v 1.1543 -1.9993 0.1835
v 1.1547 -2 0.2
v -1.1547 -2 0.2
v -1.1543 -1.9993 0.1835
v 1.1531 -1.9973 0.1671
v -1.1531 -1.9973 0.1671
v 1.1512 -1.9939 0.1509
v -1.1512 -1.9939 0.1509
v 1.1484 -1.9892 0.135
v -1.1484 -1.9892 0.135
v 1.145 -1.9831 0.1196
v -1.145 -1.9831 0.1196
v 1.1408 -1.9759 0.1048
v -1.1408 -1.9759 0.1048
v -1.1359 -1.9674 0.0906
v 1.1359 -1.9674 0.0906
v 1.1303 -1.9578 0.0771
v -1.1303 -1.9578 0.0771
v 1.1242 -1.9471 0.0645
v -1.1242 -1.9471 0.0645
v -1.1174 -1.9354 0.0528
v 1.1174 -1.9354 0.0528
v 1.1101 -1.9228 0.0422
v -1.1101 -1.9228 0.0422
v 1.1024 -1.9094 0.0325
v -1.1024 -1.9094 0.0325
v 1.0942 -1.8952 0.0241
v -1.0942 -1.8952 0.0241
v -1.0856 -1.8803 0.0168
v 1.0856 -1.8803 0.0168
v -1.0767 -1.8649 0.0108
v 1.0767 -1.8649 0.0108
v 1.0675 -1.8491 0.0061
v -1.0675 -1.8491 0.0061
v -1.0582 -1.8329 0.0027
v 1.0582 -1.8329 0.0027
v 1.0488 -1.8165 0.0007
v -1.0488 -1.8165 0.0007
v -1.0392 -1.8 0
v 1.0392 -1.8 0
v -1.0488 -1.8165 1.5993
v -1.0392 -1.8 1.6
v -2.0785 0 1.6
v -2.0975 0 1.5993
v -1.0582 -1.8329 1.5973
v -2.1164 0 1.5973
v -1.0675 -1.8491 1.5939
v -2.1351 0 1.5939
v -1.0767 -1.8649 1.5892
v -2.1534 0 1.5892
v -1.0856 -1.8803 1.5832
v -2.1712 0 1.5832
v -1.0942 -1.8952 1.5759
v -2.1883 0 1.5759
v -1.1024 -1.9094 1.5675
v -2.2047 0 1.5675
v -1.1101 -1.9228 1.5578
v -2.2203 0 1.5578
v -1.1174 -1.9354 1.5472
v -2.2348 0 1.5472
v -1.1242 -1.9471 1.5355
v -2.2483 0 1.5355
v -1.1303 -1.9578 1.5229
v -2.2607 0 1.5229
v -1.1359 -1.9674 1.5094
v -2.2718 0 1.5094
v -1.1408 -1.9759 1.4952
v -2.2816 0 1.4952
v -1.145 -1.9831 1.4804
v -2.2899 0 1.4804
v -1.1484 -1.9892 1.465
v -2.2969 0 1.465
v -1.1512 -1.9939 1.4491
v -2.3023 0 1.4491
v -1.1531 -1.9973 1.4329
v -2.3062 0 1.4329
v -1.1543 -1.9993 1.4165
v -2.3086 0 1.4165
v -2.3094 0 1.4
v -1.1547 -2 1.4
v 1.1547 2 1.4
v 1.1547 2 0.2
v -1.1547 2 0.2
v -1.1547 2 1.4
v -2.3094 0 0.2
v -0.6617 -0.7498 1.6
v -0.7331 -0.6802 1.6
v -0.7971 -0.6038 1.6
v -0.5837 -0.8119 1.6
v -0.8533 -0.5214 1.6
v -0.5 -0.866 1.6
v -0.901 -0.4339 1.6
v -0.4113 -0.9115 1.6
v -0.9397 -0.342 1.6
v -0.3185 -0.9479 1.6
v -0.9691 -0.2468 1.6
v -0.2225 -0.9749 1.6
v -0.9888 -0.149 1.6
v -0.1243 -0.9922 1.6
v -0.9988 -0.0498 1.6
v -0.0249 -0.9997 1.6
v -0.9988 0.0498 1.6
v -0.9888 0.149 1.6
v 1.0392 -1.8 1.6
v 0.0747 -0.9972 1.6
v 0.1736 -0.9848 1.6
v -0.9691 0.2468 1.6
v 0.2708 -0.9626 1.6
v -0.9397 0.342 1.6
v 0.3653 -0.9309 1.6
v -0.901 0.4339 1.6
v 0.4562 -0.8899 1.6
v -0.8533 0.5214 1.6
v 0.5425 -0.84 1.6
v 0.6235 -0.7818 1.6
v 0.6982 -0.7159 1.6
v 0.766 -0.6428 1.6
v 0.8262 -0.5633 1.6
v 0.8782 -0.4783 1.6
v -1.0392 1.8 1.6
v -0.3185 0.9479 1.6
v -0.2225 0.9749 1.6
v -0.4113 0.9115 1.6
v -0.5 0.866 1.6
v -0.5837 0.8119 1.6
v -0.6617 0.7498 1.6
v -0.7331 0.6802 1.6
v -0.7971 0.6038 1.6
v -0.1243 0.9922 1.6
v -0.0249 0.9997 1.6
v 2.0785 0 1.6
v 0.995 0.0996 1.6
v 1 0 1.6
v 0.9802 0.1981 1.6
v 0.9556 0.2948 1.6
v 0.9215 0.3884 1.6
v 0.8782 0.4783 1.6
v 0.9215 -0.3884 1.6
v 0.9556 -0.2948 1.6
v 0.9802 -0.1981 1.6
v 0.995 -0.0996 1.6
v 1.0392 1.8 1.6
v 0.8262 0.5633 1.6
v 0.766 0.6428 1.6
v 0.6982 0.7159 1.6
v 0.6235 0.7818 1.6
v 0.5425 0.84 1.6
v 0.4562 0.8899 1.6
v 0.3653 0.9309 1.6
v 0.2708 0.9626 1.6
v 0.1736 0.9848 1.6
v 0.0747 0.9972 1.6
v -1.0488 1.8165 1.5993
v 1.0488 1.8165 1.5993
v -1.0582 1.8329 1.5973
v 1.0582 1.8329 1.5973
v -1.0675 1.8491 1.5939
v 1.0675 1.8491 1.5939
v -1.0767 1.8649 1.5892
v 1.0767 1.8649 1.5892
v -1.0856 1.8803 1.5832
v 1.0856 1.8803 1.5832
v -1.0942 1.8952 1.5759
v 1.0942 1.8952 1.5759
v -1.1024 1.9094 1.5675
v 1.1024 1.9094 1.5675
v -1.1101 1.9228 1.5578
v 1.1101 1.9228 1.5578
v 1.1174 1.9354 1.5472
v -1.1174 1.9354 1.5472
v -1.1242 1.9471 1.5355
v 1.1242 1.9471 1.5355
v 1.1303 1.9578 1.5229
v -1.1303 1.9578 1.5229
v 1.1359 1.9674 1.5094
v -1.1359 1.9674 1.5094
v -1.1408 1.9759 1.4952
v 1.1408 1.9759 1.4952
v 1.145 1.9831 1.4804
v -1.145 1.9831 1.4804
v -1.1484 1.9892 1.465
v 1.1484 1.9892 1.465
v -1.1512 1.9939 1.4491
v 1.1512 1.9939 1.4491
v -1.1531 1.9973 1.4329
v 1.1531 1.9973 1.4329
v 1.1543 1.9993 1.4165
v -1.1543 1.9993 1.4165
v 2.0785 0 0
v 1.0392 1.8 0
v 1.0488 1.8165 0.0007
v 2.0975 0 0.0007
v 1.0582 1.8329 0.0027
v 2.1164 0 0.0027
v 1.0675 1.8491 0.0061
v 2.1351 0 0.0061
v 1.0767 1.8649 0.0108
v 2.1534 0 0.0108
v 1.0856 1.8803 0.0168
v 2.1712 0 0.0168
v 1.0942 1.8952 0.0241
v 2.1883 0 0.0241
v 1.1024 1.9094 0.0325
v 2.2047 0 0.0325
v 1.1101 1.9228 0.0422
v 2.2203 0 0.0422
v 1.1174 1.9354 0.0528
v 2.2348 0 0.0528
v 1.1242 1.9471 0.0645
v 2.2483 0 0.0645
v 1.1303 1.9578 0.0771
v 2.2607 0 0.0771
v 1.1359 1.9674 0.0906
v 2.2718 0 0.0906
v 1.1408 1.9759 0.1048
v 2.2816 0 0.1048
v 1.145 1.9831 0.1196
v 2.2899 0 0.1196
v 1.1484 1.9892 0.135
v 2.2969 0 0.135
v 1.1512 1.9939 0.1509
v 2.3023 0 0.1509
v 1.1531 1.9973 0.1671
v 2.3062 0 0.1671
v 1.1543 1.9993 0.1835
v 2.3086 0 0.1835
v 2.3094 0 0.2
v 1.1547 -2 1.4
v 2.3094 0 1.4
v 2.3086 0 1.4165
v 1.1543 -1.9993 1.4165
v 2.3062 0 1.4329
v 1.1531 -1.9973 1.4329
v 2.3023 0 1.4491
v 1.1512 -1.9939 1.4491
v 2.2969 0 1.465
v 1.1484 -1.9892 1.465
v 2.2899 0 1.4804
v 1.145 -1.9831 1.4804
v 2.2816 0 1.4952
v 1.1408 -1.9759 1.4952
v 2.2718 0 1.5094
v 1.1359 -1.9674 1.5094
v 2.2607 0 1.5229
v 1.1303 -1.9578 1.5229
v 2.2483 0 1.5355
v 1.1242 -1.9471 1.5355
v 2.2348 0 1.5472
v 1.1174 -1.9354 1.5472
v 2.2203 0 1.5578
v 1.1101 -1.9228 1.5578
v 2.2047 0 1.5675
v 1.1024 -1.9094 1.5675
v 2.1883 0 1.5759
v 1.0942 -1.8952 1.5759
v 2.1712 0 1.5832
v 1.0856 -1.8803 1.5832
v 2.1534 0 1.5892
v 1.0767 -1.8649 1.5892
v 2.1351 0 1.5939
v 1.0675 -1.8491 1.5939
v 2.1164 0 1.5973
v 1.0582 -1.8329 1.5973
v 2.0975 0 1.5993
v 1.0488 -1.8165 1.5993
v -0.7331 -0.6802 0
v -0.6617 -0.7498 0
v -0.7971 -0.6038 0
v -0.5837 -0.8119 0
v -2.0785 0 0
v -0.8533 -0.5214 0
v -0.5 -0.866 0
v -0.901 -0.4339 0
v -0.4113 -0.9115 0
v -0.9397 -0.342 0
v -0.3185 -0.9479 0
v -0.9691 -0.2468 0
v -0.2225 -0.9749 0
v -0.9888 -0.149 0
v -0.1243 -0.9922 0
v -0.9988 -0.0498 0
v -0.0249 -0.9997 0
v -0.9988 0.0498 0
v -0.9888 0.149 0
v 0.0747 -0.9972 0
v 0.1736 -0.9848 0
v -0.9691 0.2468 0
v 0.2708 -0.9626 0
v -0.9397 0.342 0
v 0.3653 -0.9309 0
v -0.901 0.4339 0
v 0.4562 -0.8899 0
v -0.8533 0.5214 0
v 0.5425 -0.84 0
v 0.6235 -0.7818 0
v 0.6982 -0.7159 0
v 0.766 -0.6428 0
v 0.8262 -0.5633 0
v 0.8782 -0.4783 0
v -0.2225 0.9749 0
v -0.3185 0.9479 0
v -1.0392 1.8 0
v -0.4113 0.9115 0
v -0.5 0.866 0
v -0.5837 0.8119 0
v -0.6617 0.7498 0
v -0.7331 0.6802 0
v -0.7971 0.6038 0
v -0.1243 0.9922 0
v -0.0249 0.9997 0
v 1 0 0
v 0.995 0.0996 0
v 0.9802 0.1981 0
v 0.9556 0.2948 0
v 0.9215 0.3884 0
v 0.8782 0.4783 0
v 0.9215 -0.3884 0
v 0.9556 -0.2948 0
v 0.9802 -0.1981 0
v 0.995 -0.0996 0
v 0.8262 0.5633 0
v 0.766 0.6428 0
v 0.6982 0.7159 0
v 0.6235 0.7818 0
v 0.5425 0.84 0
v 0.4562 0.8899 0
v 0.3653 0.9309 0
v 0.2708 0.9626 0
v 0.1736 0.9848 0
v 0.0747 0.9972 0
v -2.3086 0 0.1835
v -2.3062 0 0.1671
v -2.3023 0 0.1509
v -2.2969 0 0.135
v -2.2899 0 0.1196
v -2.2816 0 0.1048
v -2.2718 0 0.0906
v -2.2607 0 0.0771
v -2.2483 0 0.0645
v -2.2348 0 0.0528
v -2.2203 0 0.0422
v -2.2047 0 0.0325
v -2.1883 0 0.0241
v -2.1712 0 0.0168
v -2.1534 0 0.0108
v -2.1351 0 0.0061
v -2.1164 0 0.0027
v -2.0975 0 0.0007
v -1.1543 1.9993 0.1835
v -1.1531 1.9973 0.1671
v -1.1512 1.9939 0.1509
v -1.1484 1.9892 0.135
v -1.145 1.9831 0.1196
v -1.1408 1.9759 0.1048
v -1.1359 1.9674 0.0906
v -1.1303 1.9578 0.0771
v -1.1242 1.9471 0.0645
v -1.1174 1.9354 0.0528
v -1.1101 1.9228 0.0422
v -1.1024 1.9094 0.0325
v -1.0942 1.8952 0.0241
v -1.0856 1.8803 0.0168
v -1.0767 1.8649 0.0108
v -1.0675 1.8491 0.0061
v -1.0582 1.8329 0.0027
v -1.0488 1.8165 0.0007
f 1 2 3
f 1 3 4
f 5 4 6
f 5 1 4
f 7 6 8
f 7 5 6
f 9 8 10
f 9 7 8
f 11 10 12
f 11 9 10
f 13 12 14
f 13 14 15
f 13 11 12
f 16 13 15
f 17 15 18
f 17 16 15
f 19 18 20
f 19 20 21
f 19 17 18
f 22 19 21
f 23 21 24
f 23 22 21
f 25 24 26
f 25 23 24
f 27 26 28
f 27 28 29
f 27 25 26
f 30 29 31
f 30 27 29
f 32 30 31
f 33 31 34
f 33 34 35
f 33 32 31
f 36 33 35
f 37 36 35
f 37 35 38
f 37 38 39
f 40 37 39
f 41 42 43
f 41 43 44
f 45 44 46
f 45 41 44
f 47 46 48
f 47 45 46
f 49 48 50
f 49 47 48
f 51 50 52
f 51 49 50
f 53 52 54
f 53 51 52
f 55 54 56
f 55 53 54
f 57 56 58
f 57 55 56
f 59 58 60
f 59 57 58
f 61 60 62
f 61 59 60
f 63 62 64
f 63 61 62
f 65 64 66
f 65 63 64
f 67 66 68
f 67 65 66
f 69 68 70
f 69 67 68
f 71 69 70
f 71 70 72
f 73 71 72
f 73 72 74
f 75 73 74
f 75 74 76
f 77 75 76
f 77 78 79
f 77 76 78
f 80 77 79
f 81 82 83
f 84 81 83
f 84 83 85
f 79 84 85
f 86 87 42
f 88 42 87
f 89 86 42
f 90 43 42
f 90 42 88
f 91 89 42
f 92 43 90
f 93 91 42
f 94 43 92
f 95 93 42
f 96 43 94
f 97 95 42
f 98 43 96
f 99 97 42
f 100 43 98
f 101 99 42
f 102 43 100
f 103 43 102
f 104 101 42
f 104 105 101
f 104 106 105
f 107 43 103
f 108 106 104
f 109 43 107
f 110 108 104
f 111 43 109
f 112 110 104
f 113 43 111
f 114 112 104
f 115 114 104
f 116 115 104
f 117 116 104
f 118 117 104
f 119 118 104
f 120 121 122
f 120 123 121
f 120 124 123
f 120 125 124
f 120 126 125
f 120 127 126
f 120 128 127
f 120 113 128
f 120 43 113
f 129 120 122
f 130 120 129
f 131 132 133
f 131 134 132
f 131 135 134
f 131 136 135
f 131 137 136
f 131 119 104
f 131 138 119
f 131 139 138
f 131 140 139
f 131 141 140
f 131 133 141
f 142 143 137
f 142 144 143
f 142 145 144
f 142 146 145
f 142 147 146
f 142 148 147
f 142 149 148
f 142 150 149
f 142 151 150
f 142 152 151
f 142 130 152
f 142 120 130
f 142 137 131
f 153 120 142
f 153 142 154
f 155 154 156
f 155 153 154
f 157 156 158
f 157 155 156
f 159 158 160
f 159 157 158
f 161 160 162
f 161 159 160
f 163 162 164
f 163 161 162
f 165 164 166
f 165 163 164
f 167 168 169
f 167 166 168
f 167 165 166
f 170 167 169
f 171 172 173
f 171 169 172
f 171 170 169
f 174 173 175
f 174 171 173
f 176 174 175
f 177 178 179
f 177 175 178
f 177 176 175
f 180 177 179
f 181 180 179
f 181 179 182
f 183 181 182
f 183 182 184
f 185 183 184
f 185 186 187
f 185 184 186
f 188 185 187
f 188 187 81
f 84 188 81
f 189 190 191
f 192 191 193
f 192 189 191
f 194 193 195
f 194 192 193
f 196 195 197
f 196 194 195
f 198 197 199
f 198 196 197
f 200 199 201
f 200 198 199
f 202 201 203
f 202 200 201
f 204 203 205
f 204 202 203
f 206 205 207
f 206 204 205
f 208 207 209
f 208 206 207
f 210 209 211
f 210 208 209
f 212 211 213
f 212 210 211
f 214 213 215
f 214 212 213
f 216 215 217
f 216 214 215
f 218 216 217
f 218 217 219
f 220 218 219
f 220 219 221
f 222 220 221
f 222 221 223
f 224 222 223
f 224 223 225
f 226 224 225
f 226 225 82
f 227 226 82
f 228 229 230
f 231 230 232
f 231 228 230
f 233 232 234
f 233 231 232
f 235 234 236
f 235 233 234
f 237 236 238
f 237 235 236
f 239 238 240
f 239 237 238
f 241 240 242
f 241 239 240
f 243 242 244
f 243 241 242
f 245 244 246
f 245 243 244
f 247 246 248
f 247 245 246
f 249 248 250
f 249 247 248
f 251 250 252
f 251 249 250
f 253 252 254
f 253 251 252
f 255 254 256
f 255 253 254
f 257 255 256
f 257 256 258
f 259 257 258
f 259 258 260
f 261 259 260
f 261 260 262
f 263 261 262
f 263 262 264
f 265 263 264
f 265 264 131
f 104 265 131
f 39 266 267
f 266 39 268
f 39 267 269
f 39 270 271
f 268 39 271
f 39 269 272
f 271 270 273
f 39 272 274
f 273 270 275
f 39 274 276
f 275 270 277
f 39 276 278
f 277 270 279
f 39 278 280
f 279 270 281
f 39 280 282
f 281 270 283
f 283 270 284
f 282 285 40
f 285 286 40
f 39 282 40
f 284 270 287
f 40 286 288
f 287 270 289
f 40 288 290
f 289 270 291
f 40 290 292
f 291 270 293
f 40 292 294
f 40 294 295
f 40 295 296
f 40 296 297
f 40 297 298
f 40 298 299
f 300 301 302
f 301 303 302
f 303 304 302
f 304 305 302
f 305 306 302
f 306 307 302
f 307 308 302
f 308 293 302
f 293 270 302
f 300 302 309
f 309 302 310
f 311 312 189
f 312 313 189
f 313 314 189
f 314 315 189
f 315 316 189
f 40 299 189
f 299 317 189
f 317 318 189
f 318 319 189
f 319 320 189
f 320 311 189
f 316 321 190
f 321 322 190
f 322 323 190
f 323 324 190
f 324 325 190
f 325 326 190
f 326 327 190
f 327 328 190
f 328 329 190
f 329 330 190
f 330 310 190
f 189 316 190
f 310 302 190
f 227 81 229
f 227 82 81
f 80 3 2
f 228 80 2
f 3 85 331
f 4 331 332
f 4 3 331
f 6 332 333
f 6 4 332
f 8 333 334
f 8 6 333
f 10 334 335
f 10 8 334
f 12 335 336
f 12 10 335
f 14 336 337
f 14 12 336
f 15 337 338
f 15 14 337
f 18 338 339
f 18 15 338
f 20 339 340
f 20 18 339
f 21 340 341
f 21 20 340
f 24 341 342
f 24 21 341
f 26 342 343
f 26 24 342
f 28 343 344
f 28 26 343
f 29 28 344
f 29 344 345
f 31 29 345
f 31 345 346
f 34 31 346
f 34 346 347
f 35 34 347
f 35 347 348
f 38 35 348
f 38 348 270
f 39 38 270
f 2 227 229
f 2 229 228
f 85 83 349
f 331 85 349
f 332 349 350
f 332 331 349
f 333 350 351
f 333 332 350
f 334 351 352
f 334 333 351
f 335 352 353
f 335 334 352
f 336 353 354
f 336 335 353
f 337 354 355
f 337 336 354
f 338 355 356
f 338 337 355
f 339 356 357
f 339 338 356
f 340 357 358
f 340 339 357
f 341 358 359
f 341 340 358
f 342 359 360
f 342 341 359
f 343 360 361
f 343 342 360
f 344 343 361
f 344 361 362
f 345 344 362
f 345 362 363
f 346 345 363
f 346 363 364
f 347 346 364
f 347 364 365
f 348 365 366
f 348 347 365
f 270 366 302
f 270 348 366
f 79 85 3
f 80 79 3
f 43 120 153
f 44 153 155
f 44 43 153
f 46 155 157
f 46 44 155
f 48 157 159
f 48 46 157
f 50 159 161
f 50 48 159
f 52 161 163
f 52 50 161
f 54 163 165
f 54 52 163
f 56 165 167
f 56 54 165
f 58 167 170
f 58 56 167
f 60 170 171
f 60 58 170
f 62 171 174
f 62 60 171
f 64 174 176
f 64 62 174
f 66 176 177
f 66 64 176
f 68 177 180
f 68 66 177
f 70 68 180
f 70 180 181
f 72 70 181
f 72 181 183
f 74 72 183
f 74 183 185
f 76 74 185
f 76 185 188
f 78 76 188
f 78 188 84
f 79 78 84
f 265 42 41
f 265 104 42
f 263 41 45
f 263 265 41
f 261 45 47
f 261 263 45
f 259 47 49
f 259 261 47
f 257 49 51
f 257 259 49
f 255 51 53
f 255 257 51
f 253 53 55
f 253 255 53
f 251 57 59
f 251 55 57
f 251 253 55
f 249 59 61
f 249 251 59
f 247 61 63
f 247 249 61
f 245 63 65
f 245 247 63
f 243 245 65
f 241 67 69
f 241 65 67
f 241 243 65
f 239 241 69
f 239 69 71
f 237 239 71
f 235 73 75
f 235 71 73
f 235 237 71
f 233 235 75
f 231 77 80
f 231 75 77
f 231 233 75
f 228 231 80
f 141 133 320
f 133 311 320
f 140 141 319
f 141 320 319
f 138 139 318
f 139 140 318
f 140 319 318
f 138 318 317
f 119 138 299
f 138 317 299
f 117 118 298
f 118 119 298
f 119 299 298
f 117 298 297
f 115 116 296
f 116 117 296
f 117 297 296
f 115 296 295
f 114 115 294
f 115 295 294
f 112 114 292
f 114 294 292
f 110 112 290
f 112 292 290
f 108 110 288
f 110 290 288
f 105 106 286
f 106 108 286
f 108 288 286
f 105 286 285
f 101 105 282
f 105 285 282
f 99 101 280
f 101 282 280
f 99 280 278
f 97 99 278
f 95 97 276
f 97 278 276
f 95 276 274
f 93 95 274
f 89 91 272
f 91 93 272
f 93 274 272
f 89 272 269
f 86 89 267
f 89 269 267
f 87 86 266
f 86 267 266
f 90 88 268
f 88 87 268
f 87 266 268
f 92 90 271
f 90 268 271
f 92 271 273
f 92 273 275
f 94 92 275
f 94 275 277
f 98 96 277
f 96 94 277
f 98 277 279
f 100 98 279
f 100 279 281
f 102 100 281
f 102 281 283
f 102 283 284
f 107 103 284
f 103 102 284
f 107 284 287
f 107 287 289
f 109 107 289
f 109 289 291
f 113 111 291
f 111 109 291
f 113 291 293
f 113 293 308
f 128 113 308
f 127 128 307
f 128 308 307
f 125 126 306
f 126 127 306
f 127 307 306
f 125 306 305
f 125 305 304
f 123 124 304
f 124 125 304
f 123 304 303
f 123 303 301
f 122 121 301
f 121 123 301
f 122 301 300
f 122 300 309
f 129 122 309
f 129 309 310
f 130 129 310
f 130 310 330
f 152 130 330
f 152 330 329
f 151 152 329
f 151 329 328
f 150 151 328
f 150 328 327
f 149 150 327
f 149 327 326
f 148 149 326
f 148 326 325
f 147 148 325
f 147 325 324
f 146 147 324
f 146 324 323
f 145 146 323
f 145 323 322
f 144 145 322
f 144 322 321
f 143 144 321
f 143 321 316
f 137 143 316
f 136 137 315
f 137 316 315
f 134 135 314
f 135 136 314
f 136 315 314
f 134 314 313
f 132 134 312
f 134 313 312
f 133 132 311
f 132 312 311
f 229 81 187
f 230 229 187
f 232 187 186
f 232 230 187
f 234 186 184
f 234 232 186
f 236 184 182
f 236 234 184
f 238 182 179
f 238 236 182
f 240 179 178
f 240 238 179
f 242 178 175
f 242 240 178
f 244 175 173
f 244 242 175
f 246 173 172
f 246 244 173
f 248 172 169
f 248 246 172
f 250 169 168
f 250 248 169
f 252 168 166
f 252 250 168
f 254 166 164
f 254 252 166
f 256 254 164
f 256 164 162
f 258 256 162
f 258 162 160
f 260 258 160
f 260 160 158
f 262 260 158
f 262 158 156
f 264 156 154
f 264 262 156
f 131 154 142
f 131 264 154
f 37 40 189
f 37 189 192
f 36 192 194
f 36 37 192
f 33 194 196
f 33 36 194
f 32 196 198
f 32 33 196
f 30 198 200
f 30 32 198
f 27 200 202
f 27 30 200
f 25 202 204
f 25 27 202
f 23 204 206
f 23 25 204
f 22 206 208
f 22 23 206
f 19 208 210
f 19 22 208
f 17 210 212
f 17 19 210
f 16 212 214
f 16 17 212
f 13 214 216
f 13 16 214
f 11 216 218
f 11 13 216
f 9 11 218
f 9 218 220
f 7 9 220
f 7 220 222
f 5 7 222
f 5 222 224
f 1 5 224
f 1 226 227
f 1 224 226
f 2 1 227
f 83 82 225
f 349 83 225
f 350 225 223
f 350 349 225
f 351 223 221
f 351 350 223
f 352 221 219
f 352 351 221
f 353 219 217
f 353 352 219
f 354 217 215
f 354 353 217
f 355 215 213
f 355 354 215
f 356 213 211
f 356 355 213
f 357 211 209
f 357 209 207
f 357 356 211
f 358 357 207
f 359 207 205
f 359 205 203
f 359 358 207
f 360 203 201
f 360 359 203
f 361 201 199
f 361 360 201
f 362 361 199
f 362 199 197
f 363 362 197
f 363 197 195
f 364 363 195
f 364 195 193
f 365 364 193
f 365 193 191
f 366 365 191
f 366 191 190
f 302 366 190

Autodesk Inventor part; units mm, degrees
ref_plane "YZ Plane" through (0, 0, 0) normal (1, 0, 0) x (0, 1, 0)
ref_plane "XZ Plane" through (0, 0, 0) normal (0, 1, 0) x (-1, 0, 0)
ref_plane "XY Plane" through (0, 0, 0) normal (0, 0, 1) x (1, 0, 0)
sketch "Sketch1" plane through (0, 0, 0) normal (0, 0, 1) x (1, 0, 0)
  circle A0 centre (0, 0) radius 1
  line L0 (-1.1547, -2) -> (1.1547, -2)
  line L1 (1.1547, 2) -> (-1.1547, 2)
  line L2 (1.1547, 2) -> (2.3094, 0)
  line L3 (2.3094, 0) -> (1.1547, -2)
  line L4 (-1.1547, 2) -> (-2.3094, 0)
  line L5 (-2.3094, 0) -> (-1.1547, -2)
  dimension "d0" = 2
  dimension "d5" = 120
extrude "Extrusion1" add sketch "Sketch1" along normal blind 1.6
fillet "Fillet1" radius 0.2 12 edges at (0, -2, 1.6) (1.7321, -1, 1.6) (1.7321, 1, 1.6) (0, 2, 1.6) (-1.7321, 1, 1.6) (-1.7321, -1, 1.6) (0, 2, 0) (-1.7321, 1, 0) (-1.7321, -1, 0) (0, -2, 0) (1.7321, -1, 0) (1.7321, 1, 0)
properties part number "m2 nut"
